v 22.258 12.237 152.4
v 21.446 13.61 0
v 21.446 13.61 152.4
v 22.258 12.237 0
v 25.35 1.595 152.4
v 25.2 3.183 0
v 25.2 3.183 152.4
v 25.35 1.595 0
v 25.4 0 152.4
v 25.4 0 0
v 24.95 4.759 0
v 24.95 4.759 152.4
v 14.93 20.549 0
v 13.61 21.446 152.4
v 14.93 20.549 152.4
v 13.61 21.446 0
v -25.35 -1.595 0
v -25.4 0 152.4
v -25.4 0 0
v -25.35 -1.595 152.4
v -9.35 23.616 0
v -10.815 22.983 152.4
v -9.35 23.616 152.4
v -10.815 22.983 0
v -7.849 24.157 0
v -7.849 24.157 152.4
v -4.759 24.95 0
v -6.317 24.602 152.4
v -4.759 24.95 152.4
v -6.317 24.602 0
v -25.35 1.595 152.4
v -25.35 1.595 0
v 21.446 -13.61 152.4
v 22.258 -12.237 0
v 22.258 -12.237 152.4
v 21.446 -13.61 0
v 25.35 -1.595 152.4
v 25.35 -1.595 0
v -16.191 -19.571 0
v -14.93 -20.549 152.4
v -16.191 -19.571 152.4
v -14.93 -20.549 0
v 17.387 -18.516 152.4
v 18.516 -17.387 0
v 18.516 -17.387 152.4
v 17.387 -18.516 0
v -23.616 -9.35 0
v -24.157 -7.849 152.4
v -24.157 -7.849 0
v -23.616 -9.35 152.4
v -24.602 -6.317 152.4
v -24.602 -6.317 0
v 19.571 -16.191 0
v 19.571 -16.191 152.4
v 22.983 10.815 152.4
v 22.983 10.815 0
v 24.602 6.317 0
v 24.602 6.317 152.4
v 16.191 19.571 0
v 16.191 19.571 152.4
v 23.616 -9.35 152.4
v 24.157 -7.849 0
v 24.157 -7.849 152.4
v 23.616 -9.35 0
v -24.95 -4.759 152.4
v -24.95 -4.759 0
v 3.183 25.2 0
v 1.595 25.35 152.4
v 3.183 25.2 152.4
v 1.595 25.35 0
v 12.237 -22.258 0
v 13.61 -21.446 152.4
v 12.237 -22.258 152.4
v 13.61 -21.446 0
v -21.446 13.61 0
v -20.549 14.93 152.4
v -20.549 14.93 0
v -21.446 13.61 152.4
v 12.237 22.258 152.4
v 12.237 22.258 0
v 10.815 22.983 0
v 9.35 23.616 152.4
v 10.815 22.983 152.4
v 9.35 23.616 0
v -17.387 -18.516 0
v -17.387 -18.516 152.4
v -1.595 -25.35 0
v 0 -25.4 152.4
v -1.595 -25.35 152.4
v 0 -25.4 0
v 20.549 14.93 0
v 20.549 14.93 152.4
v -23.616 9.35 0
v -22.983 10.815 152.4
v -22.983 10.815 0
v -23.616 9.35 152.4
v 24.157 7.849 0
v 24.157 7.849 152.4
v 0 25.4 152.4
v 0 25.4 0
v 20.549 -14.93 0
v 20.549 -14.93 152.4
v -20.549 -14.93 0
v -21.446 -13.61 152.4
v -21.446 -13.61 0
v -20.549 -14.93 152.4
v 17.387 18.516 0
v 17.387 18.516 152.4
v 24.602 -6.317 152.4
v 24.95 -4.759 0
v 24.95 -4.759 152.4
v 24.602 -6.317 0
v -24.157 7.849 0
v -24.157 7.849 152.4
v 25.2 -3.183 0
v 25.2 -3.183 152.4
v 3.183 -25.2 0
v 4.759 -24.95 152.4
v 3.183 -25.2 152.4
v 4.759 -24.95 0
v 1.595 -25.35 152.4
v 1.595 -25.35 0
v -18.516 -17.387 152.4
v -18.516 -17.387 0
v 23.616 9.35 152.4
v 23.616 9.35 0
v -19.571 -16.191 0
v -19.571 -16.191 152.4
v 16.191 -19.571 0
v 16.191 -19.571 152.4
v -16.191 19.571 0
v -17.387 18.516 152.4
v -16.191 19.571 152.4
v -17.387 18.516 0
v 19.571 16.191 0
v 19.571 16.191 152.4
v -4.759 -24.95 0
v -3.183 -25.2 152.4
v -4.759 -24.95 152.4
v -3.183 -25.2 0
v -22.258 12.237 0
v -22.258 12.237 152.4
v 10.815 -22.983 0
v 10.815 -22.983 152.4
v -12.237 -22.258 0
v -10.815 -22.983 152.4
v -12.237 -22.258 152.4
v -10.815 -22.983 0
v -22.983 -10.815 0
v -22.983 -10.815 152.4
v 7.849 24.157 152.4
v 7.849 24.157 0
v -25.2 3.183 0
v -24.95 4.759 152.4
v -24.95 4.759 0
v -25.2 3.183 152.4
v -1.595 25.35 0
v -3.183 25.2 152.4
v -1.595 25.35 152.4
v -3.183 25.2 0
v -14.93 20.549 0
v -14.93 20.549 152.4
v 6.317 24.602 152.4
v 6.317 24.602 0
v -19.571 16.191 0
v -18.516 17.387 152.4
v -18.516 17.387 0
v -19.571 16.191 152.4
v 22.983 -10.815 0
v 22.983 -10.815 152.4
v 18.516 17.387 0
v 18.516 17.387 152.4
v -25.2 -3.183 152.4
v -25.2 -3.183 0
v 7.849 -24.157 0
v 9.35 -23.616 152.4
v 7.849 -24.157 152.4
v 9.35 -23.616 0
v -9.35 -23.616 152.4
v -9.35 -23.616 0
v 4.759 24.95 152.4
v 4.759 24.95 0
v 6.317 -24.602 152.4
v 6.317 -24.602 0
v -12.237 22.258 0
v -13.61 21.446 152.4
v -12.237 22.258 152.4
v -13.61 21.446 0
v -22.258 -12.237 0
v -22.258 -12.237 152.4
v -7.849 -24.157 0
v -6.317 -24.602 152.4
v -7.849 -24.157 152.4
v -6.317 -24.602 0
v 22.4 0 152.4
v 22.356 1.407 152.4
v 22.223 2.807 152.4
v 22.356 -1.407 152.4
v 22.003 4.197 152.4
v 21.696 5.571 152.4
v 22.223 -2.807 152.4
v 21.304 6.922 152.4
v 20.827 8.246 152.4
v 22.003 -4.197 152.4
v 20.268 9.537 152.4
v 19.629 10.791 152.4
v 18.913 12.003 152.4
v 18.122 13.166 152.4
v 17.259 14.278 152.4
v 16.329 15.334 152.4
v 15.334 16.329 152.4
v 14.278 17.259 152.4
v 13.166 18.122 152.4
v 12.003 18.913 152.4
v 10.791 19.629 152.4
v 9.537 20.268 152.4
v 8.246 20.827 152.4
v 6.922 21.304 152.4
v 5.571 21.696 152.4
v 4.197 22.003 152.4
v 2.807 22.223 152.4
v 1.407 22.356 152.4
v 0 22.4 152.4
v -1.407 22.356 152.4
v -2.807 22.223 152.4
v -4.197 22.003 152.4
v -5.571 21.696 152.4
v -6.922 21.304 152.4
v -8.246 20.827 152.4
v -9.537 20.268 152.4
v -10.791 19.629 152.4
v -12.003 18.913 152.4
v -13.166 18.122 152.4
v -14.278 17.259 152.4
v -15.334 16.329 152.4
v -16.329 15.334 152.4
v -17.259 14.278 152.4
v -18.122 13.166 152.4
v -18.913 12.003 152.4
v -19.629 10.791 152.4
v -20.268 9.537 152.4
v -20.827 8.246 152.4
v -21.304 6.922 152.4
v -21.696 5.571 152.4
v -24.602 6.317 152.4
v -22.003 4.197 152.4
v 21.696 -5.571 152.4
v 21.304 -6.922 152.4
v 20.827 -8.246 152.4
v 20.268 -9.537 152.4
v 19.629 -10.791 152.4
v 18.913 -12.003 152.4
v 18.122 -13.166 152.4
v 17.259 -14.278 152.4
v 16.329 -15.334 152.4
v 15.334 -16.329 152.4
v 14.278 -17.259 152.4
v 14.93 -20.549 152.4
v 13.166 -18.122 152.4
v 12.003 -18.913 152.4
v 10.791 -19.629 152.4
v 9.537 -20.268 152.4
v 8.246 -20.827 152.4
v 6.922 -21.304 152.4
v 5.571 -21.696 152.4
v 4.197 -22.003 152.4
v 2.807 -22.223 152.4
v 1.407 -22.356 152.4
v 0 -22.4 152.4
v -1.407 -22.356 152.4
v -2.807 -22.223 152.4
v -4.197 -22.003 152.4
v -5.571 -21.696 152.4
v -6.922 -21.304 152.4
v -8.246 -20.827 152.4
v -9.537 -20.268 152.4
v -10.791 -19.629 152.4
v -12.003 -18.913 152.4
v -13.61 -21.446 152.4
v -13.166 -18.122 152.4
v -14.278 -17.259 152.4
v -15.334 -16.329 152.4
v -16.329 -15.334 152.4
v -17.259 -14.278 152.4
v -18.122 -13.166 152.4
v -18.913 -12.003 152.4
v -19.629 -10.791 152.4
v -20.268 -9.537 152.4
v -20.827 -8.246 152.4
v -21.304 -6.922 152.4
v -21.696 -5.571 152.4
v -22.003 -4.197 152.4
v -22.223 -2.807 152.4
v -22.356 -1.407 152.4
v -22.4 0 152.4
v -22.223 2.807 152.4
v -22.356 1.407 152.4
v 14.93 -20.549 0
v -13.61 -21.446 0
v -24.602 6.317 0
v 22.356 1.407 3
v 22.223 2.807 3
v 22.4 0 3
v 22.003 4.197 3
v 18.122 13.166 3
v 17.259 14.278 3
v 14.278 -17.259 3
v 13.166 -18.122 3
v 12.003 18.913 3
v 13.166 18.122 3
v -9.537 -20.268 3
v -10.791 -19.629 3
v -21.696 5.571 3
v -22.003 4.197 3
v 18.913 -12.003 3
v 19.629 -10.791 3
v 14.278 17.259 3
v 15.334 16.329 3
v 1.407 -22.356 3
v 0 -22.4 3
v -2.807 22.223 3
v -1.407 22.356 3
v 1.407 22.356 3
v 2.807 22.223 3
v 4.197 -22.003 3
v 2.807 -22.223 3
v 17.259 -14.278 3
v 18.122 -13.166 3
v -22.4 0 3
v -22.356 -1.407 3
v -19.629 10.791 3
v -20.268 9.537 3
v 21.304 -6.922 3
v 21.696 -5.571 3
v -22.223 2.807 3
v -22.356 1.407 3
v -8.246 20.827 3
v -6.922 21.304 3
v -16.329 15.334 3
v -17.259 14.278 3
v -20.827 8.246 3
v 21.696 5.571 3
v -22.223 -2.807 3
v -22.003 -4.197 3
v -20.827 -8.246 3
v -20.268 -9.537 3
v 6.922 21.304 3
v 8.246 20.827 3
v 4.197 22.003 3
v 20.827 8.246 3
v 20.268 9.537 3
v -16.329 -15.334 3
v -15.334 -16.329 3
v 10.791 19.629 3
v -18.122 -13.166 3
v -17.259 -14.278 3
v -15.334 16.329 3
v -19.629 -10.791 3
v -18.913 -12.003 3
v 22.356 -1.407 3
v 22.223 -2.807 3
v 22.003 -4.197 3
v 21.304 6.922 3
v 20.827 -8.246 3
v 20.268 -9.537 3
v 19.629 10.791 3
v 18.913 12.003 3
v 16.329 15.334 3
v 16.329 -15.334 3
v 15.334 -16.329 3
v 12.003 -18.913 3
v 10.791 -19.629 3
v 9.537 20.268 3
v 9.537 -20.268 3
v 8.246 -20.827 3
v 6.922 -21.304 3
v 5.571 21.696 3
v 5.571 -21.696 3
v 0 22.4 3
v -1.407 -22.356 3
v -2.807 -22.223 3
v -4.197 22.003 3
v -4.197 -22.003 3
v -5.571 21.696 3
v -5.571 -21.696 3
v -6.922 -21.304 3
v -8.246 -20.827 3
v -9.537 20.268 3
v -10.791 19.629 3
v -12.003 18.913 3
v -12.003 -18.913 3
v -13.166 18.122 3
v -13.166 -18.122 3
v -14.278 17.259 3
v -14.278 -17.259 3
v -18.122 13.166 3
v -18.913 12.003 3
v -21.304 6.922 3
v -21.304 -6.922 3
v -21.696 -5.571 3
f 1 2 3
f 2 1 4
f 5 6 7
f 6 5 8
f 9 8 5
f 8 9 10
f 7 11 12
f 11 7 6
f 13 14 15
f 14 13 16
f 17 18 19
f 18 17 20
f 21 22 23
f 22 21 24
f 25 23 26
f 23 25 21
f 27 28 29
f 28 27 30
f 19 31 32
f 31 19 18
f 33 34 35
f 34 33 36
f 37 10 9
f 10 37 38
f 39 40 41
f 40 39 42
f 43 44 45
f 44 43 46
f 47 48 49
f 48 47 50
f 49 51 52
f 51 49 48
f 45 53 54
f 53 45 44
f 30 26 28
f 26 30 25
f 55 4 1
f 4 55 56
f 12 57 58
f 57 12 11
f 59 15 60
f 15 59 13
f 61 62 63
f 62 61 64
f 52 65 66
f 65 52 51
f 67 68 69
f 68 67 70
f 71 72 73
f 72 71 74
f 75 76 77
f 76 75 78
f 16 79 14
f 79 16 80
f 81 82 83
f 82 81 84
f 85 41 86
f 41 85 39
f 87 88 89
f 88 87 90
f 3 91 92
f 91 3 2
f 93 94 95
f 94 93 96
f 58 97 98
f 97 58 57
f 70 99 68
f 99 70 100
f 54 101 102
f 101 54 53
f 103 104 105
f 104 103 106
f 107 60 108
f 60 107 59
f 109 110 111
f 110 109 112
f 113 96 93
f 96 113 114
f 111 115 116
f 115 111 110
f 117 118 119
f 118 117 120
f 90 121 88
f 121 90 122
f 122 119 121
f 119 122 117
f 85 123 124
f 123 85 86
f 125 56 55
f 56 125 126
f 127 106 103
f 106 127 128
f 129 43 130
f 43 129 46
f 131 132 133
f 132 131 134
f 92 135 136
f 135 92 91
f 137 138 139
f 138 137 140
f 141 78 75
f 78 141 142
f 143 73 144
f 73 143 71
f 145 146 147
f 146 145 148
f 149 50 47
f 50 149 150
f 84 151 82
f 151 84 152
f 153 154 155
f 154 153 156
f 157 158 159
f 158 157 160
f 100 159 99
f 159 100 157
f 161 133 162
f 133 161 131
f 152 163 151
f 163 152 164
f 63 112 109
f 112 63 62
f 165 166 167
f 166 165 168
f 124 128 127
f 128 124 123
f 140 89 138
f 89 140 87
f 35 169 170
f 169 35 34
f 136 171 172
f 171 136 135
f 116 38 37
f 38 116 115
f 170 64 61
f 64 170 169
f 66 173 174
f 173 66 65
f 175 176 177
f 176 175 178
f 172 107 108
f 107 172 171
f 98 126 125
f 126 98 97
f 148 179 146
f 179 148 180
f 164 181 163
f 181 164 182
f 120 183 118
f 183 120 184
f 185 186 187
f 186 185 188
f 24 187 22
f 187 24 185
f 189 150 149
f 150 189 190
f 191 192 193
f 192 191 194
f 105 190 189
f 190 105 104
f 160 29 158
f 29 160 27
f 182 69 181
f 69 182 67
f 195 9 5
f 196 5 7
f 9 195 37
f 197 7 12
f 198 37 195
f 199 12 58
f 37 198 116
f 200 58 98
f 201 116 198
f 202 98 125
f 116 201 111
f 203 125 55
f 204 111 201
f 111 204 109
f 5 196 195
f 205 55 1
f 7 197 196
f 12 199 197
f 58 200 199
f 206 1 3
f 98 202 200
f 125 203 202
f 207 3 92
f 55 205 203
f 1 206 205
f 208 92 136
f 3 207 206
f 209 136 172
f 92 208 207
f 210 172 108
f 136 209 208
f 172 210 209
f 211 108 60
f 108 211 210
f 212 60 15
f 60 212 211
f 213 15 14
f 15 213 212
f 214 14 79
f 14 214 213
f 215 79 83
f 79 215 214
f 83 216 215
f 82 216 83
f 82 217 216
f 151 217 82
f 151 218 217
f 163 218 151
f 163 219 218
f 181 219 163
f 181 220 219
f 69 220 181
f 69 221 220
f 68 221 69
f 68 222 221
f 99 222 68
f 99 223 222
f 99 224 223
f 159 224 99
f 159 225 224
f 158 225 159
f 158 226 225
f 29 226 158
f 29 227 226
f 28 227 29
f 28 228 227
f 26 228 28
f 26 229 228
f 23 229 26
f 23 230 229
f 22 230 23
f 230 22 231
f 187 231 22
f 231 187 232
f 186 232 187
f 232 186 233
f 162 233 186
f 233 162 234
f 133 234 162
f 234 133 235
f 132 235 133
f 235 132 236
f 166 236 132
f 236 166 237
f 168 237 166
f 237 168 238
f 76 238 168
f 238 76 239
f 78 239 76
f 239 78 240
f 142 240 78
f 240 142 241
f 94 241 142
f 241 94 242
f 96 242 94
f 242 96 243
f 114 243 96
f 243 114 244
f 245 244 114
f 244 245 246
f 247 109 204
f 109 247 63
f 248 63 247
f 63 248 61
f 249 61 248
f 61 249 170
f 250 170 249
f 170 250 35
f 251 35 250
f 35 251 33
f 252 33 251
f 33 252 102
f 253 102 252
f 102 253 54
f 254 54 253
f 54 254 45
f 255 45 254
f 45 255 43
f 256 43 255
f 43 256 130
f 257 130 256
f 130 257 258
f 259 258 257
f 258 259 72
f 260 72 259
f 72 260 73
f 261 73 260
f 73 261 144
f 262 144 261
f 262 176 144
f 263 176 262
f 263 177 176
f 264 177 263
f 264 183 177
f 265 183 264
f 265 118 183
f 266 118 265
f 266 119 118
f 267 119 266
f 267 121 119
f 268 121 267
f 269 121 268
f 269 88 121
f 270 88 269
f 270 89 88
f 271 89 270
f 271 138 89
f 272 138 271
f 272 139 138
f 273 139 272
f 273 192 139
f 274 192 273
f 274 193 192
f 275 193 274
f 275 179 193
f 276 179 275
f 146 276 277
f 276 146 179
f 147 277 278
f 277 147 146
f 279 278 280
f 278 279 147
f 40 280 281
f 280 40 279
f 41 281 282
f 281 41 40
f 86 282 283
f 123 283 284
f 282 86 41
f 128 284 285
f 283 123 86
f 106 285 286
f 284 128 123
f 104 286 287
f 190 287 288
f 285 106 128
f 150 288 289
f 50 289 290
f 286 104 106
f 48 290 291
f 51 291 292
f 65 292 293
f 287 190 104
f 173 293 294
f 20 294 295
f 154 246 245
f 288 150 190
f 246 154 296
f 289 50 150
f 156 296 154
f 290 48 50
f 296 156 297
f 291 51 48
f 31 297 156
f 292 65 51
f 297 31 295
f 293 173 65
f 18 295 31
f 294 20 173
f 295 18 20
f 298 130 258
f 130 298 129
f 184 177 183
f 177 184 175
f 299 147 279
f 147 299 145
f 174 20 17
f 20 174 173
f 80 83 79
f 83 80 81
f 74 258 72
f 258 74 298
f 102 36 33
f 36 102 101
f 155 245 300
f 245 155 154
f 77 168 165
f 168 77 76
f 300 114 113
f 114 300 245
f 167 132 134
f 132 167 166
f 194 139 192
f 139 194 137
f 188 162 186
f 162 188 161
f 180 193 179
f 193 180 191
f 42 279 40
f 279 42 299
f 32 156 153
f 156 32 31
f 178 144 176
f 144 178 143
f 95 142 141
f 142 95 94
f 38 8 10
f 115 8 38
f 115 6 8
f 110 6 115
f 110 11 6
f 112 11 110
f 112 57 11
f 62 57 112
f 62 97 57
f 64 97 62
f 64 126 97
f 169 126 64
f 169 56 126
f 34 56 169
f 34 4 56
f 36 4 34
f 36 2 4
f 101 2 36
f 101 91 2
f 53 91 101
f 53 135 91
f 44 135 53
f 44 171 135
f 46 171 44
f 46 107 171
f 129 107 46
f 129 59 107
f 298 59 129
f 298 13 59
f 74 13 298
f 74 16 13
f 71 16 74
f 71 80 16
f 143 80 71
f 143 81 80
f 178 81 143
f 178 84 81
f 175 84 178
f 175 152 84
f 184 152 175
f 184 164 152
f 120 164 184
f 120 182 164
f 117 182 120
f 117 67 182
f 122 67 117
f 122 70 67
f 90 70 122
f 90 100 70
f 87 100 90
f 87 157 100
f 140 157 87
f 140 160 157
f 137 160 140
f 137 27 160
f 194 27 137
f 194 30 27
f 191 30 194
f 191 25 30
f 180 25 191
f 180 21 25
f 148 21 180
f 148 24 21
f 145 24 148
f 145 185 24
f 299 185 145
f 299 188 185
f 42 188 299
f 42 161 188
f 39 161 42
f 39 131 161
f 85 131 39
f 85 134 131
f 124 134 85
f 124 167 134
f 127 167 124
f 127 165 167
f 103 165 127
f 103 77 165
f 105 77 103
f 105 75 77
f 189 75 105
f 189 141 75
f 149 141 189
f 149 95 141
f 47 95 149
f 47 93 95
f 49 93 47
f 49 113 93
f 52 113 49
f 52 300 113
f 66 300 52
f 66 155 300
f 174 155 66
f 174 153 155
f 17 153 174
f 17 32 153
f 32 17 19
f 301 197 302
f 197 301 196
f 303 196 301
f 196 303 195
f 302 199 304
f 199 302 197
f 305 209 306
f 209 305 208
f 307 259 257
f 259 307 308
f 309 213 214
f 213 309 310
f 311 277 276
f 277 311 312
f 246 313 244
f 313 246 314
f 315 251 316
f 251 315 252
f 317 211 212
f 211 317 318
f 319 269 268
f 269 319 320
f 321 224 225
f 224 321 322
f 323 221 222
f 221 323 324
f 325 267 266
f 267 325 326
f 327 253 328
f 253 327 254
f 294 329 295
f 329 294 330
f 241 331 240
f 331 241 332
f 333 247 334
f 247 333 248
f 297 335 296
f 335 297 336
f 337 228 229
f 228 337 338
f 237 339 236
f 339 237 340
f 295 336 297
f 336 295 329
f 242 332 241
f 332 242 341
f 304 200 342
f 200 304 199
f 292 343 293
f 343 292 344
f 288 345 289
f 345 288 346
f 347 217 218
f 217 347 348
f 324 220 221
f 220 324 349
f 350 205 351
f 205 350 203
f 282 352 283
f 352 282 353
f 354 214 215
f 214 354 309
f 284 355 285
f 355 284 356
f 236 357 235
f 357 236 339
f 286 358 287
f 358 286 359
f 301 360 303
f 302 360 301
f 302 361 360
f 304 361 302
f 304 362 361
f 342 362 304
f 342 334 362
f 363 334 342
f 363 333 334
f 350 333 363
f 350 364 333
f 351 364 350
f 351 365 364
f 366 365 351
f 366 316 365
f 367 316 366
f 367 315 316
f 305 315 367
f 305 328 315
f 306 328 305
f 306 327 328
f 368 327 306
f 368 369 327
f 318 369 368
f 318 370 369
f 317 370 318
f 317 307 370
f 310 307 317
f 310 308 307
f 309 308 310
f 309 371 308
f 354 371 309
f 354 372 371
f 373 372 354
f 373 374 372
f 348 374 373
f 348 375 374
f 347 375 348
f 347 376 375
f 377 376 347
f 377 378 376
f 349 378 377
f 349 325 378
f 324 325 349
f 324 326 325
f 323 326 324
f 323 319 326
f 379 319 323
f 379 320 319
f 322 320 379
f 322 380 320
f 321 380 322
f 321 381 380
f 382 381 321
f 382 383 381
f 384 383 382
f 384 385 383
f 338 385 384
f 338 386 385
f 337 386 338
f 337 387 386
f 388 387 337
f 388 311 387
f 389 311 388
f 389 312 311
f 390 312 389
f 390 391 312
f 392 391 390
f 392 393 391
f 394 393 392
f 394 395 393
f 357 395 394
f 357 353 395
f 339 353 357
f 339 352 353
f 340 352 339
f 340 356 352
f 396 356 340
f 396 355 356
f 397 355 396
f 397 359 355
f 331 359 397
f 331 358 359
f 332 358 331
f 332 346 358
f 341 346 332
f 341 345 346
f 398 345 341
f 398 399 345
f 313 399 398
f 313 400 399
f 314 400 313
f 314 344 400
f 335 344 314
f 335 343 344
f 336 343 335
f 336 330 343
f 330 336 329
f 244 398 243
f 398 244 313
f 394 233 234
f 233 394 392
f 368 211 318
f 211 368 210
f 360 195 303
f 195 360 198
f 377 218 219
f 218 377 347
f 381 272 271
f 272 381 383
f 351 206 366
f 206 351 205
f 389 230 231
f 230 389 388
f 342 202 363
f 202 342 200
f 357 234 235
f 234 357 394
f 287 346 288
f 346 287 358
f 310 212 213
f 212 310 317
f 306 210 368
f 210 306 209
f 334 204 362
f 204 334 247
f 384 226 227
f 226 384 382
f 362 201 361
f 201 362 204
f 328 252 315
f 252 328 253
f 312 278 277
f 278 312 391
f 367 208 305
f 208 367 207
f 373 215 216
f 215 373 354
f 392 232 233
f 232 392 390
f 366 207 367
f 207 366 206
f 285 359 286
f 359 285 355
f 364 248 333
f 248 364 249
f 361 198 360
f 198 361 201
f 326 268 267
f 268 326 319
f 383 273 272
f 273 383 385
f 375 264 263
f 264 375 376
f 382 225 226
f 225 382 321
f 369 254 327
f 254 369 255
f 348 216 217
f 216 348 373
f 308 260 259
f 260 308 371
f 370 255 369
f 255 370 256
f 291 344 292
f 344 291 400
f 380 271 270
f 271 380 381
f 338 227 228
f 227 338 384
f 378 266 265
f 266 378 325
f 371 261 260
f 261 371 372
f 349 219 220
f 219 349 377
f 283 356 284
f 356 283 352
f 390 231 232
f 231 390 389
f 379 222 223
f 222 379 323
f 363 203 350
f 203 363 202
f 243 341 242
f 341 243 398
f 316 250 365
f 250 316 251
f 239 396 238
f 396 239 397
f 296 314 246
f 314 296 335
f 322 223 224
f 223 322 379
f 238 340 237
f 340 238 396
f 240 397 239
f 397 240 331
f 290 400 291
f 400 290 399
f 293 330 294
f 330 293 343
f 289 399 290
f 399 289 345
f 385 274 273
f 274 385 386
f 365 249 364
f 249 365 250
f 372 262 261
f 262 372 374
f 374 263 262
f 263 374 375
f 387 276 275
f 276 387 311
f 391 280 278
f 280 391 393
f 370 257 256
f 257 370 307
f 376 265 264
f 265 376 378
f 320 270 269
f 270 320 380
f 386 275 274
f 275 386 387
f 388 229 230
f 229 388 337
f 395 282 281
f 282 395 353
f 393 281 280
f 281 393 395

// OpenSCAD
// Cup dimensions
cup_height_inches = 6;
cup_diameter_inches = 2;
wall_thickness_mm = 3; // Using 3mm as a typical wall thickness

// Convert inches to mm
inch_to_mm = 25.4;
cup_height_mm = cup_height_inches * inch_to_mm;
cup_outer_radius_mm = (cup_diameter_inches / 2) * inch_to_mm;

// Number of fragments for curved surfaces (higher means smoother)
$fn = 100;

// Calculate inner dimensions
cup_inner_radius_mm = cup_outer_radius_mm - wall_thickness_mm;
// The height of the internal void.
// It starts above the base (at wall_thickness_mm) and goes up to the top of the cup.
inner_void_height_mm = cup_height_mm - wall_thickness_mm;

// Create the cup using a difference operation
difference() {
    // Outer cylinder: defines the external shape of the cup
    cylinder(h = cup_height_mm, r = cup_outer_radius_mm);

    // Inner cylinder: defines the hollow part to be subtracted
    // It is translated upwards by wall_thickness_mm to form the base of the cup.
    // A small epsilon (0.1mm) is added to its height to ensure a clean subtraction at the top rim.     
    translate([0, 0, wall_thickness_mm]) {
        cylinder(h = inner_void_height_mm + 0.1, r = cup_inner_radius_mm);
    }
}

// Output dimensions for reference (these are just comments)
// Cup Height: 152.4 mm
// Cup Outer Radius: 25.4 mm
// Cup Inner Radius: 22.4 mm
// Wall Thickness: 3 mm
// Base Thickness: 3 mm
